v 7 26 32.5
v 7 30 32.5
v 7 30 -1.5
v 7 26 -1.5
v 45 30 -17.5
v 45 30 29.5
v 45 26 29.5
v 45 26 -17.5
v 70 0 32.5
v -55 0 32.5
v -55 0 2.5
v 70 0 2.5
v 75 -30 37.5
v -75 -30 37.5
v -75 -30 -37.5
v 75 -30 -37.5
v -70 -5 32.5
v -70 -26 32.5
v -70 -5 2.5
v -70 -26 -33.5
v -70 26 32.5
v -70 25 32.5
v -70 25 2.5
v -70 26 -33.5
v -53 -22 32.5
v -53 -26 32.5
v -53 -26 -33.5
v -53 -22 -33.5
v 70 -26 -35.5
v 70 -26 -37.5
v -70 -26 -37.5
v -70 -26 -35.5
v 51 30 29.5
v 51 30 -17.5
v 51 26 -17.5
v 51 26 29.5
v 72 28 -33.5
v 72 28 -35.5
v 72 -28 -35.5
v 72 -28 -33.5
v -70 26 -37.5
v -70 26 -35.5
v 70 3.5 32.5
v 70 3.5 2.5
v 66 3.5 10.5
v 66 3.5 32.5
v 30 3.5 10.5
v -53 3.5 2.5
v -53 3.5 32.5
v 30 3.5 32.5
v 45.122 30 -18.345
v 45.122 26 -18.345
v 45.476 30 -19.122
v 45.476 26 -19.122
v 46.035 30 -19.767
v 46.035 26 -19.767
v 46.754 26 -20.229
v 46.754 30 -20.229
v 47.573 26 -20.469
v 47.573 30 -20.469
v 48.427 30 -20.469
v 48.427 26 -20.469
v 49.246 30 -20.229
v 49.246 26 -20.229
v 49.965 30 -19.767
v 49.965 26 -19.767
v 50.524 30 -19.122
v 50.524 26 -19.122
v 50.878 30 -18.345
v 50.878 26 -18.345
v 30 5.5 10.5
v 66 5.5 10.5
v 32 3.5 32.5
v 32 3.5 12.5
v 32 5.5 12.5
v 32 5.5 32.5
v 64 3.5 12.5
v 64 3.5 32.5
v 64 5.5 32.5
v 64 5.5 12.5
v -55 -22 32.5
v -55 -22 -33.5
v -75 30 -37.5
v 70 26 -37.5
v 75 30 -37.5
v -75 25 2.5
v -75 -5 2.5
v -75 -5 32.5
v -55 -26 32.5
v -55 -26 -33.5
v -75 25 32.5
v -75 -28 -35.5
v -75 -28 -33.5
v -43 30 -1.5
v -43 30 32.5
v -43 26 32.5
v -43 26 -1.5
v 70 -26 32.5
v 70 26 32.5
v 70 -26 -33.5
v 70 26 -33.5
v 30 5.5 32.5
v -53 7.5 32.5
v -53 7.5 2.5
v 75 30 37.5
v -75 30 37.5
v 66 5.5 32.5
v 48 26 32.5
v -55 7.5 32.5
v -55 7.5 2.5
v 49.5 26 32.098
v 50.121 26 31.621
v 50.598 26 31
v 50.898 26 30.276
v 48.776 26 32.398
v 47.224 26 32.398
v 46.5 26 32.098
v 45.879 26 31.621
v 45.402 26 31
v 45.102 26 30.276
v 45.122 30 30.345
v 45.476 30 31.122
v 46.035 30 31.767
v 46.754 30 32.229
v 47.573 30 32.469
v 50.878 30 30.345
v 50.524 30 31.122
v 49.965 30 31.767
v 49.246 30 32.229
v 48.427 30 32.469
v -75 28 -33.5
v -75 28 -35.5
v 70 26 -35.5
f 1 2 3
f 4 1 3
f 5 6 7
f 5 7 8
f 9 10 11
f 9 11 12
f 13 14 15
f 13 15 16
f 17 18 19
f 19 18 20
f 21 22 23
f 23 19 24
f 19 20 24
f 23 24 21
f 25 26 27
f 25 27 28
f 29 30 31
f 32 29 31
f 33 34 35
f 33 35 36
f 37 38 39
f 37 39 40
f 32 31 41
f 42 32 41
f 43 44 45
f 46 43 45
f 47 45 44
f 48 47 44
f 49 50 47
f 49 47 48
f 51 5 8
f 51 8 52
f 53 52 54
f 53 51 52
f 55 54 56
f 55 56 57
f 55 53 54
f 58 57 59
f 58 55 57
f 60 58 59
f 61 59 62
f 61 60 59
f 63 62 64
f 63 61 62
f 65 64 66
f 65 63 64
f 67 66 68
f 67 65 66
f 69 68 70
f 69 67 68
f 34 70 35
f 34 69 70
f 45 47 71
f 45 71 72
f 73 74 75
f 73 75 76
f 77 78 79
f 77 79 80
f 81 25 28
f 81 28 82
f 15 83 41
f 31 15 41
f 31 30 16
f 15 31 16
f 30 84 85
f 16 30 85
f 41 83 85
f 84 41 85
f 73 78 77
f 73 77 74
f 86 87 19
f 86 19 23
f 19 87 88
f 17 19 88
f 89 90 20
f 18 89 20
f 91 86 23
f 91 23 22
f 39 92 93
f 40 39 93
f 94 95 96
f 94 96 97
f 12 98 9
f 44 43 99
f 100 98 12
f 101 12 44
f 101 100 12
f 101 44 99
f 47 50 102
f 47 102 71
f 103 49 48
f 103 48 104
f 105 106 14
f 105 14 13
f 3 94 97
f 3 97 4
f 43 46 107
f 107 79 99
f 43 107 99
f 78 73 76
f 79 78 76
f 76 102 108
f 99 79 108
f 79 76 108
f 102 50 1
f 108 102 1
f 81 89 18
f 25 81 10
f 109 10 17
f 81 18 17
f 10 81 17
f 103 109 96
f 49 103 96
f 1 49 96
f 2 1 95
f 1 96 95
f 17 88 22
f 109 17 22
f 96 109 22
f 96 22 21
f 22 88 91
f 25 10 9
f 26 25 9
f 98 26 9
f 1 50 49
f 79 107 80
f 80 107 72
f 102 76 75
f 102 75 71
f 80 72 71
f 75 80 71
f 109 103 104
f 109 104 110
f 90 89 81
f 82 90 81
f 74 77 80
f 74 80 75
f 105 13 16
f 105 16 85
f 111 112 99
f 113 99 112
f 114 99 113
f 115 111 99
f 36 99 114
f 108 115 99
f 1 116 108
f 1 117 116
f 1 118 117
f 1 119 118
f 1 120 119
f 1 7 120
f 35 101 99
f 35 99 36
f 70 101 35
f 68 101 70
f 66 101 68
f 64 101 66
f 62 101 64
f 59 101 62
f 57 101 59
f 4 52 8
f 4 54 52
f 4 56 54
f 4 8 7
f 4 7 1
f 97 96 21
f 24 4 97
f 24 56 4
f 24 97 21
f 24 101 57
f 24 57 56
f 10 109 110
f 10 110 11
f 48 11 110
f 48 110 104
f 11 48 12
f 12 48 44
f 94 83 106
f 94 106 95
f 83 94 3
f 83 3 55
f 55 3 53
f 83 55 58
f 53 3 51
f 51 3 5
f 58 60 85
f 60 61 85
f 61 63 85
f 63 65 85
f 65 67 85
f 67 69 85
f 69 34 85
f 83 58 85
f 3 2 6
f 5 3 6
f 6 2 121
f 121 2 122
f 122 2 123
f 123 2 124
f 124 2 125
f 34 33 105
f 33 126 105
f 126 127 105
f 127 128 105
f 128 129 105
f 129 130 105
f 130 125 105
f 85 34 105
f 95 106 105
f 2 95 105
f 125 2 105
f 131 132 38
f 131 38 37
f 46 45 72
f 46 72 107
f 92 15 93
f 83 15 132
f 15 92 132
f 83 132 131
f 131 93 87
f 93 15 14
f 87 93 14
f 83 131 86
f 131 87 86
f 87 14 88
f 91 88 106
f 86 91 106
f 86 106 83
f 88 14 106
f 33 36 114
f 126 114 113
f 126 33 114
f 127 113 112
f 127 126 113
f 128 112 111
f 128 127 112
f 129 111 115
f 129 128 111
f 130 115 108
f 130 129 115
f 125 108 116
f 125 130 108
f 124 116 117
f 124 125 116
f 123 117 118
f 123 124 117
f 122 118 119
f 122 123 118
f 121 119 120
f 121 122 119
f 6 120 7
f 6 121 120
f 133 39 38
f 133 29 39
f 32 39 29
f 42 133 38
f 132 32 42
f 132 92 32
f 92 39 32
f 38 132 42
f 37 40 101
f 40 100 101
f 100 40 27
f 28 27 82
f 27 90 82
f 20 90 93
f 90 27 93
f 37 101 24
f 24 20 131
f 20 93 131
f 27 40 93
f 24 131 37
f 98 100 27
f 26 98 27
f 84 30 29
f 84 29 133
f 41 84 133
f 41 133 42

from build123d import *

# Parameters (mm, degrees)
ESQUISSE1_W                 = 150
ESQUISSE1_H                 = 60
BOSS_EXTRU_1_DEPTH          = 37.5
ESQUISSE3_W                 = 140
ESQUISSE3_H                 = 52
ENL_V_MAT_EXTRU_2_DEPTH     = 70
ENL_V_MAT_VENTILATEUR_REACH = 159.5
ESQUISSE6_W                 = 30
ESQUISSE6_H                 = 30
ESQUISSE7_W                 = 2
ESQUISSE7_H                 = 4
BOSS_EXTRU_2_DEPTH          = 66
BOSS_EXTRU_3_DEPTH          = 30
ENL_V_MAT_ECRAN_REACH       = 105.108
ESQUISSE11_W                = 50
ESQUISSE11_H                = 34
ENL_V_MAT_MOLETTE_DEPTH     = 4
ESQUISSE15_W                = 2
ESQUISSE15_H                = 56
ENL_V_MAT_PAROI_DEPTH       = 147
BOSS_MOLETTE_DEPTH          = 2


with BuildPart() as part:
    # Esquisse1 → Boss.-Extru.1 (new, symmetric)
    with BuildSketch(Plane.XY):
        Rectangle(ESQUISSE1_W, ESQUISSE1_H)
    extrude(amount=BOSS_EXTRU_1_DEPTH, both=True)

    # Esquisse3 → Enlèv. mat.-Extru.2 (cut)
    with BuildSketch(Plane(origin=(0, 0, -37.5), x_dir=(-1, 0, 0), z_dir=(0, 0, -1))):
        Rectangle(ESQUISSE3_W, ESQUISSE3_H)
    extrude(amount=-ENL_V_MAT_EXTRU_2_DEPTH, mode=Mode.SUBTRACT)

    # Esquisse6 → Enlèv. mat.-Ventilateur (cut, up to next)
    with BuildSketch(Plane.ZY.offset(75), mode=Mode.PRIVATE) as enl_v_mat_ventilateur_sk1:
        with Locations((17.5, 10)):
            Rectangle(ESQUISSE6_W, ESQUISSE6_H)
    enl_v_mat_ventilateur_tool1 = extrude(enl_v_mat_ventilateur_sk1.sketch, amount=-ENL_V_MAT_VENTILATEUR_REACH, mode=Mode.PRIVATE) & part.part
    add(enl_v_mat_ventilateur_tool1.solids().sort_by_distance((-75, 10, 17.5))[0], mode=Mode.SUBTRACT)

    # Esquisse7 → Boss.-Extru.2 (add)
    with BuildSketch(Plane(origin=(0, 0, 32.5), x_dir=(-1, 0, 0), z_dir=(0, 0, -1))):
        with Locations((54, -24)):
            Rectangle(ESQUISSE7_W, ESQUISSE7_H)
    extrude(amount=BOSS_EXTRU_2_DEPTH)

    # Esquisse9 → Boss.-Extru.3 (add)
    with BuildSketch(Plane(origin=(0, 0, 32.5), x_dir=(-1, 0, 0), z_dir=(0, 0, -1))):
        Polygon((-70, 3.5), (53, 3.5), (53, 7.5), (55, 7.5), (55, 0), (-70, 0), align=None)
    extrude(amount=BOSS_EXTRU_3_DEPTH)

    # Esquisse11 → Enlèv. mat.-ecran (cut, up to next)
    with BuildSketch(Plane(origin=(0, 30, 0), x_dir=(1, 0, 0), z_dir=(0, 1, 0)), mode=Mode.PRIVATE) as enl_v_mat_ecran_sk1:
        with Locations((-18, -15.5)):
            Rectangle(ESQUISSE11_W, ESQUISSE11_H)
    enl_v_mat_ecran_tool1 = extrude(enl_v_mat_ecran_sk1.sketch, amount=-ENL_V_MAT_ECRAN_REACH, mode=Mode.PRIVATE) & part.part
    add(enl_v_mat_ecran_tool1.solids().sort_by_distance((-18, 30, 15.5))[0], mode=Mode.SUBTRACT)

    # Esquisse14 → Enlèv. mat.-molette (cut)
    with BuildSketch(Plane(origin=(0, 30, 0), x_dir=(1, 0, 0), z_dir=(0, 1, 0))):
        with BuildLine():
            Line((51, 17.5), (51, -29.5))
            ThreePointArc((51, -29.5), (48, -32.5), (45, -29.5))
            Line((45, -29.5), (45, 17.5))
            ThreePointArc((45, 17.5), (48, 20.5), (51, 17.5))
        make_face()
    extrude(amount=-ENL_V_MAT_MOLETTE_DEPTH, mode=Mode.SUBTRACT)

    # Esquisse15 → Enlèv. mat.-paroi (cut)
    with BuildSketch(Plane.ZY.offset(75)):
        with Locations((-34.5, 0)):
            Rectangle(ESQUISSE15_W, ESQUISSE15_H)
    extrude(amount=-ENL_V_MAT_PAROI_DEPTH, mode=Mode.SUBTRACT)

    # Esquisse16 → Boss.-molette (add)
    with BuildSketch(Plane(origin=(0, 3.5, 0), x_dir=(1, 0, 0), z_dir=(0, 1, 0))):
        Polygon((64, -32.5), (64, -12.5), (32, -12.5), (32, -32.5), (30, -32.5), (30, -10.5), (66, -10.5), (66, -32.5), align=None)
    extrude(amount=BOSS_MOLETTE_DEPTH)


solid = part.part
